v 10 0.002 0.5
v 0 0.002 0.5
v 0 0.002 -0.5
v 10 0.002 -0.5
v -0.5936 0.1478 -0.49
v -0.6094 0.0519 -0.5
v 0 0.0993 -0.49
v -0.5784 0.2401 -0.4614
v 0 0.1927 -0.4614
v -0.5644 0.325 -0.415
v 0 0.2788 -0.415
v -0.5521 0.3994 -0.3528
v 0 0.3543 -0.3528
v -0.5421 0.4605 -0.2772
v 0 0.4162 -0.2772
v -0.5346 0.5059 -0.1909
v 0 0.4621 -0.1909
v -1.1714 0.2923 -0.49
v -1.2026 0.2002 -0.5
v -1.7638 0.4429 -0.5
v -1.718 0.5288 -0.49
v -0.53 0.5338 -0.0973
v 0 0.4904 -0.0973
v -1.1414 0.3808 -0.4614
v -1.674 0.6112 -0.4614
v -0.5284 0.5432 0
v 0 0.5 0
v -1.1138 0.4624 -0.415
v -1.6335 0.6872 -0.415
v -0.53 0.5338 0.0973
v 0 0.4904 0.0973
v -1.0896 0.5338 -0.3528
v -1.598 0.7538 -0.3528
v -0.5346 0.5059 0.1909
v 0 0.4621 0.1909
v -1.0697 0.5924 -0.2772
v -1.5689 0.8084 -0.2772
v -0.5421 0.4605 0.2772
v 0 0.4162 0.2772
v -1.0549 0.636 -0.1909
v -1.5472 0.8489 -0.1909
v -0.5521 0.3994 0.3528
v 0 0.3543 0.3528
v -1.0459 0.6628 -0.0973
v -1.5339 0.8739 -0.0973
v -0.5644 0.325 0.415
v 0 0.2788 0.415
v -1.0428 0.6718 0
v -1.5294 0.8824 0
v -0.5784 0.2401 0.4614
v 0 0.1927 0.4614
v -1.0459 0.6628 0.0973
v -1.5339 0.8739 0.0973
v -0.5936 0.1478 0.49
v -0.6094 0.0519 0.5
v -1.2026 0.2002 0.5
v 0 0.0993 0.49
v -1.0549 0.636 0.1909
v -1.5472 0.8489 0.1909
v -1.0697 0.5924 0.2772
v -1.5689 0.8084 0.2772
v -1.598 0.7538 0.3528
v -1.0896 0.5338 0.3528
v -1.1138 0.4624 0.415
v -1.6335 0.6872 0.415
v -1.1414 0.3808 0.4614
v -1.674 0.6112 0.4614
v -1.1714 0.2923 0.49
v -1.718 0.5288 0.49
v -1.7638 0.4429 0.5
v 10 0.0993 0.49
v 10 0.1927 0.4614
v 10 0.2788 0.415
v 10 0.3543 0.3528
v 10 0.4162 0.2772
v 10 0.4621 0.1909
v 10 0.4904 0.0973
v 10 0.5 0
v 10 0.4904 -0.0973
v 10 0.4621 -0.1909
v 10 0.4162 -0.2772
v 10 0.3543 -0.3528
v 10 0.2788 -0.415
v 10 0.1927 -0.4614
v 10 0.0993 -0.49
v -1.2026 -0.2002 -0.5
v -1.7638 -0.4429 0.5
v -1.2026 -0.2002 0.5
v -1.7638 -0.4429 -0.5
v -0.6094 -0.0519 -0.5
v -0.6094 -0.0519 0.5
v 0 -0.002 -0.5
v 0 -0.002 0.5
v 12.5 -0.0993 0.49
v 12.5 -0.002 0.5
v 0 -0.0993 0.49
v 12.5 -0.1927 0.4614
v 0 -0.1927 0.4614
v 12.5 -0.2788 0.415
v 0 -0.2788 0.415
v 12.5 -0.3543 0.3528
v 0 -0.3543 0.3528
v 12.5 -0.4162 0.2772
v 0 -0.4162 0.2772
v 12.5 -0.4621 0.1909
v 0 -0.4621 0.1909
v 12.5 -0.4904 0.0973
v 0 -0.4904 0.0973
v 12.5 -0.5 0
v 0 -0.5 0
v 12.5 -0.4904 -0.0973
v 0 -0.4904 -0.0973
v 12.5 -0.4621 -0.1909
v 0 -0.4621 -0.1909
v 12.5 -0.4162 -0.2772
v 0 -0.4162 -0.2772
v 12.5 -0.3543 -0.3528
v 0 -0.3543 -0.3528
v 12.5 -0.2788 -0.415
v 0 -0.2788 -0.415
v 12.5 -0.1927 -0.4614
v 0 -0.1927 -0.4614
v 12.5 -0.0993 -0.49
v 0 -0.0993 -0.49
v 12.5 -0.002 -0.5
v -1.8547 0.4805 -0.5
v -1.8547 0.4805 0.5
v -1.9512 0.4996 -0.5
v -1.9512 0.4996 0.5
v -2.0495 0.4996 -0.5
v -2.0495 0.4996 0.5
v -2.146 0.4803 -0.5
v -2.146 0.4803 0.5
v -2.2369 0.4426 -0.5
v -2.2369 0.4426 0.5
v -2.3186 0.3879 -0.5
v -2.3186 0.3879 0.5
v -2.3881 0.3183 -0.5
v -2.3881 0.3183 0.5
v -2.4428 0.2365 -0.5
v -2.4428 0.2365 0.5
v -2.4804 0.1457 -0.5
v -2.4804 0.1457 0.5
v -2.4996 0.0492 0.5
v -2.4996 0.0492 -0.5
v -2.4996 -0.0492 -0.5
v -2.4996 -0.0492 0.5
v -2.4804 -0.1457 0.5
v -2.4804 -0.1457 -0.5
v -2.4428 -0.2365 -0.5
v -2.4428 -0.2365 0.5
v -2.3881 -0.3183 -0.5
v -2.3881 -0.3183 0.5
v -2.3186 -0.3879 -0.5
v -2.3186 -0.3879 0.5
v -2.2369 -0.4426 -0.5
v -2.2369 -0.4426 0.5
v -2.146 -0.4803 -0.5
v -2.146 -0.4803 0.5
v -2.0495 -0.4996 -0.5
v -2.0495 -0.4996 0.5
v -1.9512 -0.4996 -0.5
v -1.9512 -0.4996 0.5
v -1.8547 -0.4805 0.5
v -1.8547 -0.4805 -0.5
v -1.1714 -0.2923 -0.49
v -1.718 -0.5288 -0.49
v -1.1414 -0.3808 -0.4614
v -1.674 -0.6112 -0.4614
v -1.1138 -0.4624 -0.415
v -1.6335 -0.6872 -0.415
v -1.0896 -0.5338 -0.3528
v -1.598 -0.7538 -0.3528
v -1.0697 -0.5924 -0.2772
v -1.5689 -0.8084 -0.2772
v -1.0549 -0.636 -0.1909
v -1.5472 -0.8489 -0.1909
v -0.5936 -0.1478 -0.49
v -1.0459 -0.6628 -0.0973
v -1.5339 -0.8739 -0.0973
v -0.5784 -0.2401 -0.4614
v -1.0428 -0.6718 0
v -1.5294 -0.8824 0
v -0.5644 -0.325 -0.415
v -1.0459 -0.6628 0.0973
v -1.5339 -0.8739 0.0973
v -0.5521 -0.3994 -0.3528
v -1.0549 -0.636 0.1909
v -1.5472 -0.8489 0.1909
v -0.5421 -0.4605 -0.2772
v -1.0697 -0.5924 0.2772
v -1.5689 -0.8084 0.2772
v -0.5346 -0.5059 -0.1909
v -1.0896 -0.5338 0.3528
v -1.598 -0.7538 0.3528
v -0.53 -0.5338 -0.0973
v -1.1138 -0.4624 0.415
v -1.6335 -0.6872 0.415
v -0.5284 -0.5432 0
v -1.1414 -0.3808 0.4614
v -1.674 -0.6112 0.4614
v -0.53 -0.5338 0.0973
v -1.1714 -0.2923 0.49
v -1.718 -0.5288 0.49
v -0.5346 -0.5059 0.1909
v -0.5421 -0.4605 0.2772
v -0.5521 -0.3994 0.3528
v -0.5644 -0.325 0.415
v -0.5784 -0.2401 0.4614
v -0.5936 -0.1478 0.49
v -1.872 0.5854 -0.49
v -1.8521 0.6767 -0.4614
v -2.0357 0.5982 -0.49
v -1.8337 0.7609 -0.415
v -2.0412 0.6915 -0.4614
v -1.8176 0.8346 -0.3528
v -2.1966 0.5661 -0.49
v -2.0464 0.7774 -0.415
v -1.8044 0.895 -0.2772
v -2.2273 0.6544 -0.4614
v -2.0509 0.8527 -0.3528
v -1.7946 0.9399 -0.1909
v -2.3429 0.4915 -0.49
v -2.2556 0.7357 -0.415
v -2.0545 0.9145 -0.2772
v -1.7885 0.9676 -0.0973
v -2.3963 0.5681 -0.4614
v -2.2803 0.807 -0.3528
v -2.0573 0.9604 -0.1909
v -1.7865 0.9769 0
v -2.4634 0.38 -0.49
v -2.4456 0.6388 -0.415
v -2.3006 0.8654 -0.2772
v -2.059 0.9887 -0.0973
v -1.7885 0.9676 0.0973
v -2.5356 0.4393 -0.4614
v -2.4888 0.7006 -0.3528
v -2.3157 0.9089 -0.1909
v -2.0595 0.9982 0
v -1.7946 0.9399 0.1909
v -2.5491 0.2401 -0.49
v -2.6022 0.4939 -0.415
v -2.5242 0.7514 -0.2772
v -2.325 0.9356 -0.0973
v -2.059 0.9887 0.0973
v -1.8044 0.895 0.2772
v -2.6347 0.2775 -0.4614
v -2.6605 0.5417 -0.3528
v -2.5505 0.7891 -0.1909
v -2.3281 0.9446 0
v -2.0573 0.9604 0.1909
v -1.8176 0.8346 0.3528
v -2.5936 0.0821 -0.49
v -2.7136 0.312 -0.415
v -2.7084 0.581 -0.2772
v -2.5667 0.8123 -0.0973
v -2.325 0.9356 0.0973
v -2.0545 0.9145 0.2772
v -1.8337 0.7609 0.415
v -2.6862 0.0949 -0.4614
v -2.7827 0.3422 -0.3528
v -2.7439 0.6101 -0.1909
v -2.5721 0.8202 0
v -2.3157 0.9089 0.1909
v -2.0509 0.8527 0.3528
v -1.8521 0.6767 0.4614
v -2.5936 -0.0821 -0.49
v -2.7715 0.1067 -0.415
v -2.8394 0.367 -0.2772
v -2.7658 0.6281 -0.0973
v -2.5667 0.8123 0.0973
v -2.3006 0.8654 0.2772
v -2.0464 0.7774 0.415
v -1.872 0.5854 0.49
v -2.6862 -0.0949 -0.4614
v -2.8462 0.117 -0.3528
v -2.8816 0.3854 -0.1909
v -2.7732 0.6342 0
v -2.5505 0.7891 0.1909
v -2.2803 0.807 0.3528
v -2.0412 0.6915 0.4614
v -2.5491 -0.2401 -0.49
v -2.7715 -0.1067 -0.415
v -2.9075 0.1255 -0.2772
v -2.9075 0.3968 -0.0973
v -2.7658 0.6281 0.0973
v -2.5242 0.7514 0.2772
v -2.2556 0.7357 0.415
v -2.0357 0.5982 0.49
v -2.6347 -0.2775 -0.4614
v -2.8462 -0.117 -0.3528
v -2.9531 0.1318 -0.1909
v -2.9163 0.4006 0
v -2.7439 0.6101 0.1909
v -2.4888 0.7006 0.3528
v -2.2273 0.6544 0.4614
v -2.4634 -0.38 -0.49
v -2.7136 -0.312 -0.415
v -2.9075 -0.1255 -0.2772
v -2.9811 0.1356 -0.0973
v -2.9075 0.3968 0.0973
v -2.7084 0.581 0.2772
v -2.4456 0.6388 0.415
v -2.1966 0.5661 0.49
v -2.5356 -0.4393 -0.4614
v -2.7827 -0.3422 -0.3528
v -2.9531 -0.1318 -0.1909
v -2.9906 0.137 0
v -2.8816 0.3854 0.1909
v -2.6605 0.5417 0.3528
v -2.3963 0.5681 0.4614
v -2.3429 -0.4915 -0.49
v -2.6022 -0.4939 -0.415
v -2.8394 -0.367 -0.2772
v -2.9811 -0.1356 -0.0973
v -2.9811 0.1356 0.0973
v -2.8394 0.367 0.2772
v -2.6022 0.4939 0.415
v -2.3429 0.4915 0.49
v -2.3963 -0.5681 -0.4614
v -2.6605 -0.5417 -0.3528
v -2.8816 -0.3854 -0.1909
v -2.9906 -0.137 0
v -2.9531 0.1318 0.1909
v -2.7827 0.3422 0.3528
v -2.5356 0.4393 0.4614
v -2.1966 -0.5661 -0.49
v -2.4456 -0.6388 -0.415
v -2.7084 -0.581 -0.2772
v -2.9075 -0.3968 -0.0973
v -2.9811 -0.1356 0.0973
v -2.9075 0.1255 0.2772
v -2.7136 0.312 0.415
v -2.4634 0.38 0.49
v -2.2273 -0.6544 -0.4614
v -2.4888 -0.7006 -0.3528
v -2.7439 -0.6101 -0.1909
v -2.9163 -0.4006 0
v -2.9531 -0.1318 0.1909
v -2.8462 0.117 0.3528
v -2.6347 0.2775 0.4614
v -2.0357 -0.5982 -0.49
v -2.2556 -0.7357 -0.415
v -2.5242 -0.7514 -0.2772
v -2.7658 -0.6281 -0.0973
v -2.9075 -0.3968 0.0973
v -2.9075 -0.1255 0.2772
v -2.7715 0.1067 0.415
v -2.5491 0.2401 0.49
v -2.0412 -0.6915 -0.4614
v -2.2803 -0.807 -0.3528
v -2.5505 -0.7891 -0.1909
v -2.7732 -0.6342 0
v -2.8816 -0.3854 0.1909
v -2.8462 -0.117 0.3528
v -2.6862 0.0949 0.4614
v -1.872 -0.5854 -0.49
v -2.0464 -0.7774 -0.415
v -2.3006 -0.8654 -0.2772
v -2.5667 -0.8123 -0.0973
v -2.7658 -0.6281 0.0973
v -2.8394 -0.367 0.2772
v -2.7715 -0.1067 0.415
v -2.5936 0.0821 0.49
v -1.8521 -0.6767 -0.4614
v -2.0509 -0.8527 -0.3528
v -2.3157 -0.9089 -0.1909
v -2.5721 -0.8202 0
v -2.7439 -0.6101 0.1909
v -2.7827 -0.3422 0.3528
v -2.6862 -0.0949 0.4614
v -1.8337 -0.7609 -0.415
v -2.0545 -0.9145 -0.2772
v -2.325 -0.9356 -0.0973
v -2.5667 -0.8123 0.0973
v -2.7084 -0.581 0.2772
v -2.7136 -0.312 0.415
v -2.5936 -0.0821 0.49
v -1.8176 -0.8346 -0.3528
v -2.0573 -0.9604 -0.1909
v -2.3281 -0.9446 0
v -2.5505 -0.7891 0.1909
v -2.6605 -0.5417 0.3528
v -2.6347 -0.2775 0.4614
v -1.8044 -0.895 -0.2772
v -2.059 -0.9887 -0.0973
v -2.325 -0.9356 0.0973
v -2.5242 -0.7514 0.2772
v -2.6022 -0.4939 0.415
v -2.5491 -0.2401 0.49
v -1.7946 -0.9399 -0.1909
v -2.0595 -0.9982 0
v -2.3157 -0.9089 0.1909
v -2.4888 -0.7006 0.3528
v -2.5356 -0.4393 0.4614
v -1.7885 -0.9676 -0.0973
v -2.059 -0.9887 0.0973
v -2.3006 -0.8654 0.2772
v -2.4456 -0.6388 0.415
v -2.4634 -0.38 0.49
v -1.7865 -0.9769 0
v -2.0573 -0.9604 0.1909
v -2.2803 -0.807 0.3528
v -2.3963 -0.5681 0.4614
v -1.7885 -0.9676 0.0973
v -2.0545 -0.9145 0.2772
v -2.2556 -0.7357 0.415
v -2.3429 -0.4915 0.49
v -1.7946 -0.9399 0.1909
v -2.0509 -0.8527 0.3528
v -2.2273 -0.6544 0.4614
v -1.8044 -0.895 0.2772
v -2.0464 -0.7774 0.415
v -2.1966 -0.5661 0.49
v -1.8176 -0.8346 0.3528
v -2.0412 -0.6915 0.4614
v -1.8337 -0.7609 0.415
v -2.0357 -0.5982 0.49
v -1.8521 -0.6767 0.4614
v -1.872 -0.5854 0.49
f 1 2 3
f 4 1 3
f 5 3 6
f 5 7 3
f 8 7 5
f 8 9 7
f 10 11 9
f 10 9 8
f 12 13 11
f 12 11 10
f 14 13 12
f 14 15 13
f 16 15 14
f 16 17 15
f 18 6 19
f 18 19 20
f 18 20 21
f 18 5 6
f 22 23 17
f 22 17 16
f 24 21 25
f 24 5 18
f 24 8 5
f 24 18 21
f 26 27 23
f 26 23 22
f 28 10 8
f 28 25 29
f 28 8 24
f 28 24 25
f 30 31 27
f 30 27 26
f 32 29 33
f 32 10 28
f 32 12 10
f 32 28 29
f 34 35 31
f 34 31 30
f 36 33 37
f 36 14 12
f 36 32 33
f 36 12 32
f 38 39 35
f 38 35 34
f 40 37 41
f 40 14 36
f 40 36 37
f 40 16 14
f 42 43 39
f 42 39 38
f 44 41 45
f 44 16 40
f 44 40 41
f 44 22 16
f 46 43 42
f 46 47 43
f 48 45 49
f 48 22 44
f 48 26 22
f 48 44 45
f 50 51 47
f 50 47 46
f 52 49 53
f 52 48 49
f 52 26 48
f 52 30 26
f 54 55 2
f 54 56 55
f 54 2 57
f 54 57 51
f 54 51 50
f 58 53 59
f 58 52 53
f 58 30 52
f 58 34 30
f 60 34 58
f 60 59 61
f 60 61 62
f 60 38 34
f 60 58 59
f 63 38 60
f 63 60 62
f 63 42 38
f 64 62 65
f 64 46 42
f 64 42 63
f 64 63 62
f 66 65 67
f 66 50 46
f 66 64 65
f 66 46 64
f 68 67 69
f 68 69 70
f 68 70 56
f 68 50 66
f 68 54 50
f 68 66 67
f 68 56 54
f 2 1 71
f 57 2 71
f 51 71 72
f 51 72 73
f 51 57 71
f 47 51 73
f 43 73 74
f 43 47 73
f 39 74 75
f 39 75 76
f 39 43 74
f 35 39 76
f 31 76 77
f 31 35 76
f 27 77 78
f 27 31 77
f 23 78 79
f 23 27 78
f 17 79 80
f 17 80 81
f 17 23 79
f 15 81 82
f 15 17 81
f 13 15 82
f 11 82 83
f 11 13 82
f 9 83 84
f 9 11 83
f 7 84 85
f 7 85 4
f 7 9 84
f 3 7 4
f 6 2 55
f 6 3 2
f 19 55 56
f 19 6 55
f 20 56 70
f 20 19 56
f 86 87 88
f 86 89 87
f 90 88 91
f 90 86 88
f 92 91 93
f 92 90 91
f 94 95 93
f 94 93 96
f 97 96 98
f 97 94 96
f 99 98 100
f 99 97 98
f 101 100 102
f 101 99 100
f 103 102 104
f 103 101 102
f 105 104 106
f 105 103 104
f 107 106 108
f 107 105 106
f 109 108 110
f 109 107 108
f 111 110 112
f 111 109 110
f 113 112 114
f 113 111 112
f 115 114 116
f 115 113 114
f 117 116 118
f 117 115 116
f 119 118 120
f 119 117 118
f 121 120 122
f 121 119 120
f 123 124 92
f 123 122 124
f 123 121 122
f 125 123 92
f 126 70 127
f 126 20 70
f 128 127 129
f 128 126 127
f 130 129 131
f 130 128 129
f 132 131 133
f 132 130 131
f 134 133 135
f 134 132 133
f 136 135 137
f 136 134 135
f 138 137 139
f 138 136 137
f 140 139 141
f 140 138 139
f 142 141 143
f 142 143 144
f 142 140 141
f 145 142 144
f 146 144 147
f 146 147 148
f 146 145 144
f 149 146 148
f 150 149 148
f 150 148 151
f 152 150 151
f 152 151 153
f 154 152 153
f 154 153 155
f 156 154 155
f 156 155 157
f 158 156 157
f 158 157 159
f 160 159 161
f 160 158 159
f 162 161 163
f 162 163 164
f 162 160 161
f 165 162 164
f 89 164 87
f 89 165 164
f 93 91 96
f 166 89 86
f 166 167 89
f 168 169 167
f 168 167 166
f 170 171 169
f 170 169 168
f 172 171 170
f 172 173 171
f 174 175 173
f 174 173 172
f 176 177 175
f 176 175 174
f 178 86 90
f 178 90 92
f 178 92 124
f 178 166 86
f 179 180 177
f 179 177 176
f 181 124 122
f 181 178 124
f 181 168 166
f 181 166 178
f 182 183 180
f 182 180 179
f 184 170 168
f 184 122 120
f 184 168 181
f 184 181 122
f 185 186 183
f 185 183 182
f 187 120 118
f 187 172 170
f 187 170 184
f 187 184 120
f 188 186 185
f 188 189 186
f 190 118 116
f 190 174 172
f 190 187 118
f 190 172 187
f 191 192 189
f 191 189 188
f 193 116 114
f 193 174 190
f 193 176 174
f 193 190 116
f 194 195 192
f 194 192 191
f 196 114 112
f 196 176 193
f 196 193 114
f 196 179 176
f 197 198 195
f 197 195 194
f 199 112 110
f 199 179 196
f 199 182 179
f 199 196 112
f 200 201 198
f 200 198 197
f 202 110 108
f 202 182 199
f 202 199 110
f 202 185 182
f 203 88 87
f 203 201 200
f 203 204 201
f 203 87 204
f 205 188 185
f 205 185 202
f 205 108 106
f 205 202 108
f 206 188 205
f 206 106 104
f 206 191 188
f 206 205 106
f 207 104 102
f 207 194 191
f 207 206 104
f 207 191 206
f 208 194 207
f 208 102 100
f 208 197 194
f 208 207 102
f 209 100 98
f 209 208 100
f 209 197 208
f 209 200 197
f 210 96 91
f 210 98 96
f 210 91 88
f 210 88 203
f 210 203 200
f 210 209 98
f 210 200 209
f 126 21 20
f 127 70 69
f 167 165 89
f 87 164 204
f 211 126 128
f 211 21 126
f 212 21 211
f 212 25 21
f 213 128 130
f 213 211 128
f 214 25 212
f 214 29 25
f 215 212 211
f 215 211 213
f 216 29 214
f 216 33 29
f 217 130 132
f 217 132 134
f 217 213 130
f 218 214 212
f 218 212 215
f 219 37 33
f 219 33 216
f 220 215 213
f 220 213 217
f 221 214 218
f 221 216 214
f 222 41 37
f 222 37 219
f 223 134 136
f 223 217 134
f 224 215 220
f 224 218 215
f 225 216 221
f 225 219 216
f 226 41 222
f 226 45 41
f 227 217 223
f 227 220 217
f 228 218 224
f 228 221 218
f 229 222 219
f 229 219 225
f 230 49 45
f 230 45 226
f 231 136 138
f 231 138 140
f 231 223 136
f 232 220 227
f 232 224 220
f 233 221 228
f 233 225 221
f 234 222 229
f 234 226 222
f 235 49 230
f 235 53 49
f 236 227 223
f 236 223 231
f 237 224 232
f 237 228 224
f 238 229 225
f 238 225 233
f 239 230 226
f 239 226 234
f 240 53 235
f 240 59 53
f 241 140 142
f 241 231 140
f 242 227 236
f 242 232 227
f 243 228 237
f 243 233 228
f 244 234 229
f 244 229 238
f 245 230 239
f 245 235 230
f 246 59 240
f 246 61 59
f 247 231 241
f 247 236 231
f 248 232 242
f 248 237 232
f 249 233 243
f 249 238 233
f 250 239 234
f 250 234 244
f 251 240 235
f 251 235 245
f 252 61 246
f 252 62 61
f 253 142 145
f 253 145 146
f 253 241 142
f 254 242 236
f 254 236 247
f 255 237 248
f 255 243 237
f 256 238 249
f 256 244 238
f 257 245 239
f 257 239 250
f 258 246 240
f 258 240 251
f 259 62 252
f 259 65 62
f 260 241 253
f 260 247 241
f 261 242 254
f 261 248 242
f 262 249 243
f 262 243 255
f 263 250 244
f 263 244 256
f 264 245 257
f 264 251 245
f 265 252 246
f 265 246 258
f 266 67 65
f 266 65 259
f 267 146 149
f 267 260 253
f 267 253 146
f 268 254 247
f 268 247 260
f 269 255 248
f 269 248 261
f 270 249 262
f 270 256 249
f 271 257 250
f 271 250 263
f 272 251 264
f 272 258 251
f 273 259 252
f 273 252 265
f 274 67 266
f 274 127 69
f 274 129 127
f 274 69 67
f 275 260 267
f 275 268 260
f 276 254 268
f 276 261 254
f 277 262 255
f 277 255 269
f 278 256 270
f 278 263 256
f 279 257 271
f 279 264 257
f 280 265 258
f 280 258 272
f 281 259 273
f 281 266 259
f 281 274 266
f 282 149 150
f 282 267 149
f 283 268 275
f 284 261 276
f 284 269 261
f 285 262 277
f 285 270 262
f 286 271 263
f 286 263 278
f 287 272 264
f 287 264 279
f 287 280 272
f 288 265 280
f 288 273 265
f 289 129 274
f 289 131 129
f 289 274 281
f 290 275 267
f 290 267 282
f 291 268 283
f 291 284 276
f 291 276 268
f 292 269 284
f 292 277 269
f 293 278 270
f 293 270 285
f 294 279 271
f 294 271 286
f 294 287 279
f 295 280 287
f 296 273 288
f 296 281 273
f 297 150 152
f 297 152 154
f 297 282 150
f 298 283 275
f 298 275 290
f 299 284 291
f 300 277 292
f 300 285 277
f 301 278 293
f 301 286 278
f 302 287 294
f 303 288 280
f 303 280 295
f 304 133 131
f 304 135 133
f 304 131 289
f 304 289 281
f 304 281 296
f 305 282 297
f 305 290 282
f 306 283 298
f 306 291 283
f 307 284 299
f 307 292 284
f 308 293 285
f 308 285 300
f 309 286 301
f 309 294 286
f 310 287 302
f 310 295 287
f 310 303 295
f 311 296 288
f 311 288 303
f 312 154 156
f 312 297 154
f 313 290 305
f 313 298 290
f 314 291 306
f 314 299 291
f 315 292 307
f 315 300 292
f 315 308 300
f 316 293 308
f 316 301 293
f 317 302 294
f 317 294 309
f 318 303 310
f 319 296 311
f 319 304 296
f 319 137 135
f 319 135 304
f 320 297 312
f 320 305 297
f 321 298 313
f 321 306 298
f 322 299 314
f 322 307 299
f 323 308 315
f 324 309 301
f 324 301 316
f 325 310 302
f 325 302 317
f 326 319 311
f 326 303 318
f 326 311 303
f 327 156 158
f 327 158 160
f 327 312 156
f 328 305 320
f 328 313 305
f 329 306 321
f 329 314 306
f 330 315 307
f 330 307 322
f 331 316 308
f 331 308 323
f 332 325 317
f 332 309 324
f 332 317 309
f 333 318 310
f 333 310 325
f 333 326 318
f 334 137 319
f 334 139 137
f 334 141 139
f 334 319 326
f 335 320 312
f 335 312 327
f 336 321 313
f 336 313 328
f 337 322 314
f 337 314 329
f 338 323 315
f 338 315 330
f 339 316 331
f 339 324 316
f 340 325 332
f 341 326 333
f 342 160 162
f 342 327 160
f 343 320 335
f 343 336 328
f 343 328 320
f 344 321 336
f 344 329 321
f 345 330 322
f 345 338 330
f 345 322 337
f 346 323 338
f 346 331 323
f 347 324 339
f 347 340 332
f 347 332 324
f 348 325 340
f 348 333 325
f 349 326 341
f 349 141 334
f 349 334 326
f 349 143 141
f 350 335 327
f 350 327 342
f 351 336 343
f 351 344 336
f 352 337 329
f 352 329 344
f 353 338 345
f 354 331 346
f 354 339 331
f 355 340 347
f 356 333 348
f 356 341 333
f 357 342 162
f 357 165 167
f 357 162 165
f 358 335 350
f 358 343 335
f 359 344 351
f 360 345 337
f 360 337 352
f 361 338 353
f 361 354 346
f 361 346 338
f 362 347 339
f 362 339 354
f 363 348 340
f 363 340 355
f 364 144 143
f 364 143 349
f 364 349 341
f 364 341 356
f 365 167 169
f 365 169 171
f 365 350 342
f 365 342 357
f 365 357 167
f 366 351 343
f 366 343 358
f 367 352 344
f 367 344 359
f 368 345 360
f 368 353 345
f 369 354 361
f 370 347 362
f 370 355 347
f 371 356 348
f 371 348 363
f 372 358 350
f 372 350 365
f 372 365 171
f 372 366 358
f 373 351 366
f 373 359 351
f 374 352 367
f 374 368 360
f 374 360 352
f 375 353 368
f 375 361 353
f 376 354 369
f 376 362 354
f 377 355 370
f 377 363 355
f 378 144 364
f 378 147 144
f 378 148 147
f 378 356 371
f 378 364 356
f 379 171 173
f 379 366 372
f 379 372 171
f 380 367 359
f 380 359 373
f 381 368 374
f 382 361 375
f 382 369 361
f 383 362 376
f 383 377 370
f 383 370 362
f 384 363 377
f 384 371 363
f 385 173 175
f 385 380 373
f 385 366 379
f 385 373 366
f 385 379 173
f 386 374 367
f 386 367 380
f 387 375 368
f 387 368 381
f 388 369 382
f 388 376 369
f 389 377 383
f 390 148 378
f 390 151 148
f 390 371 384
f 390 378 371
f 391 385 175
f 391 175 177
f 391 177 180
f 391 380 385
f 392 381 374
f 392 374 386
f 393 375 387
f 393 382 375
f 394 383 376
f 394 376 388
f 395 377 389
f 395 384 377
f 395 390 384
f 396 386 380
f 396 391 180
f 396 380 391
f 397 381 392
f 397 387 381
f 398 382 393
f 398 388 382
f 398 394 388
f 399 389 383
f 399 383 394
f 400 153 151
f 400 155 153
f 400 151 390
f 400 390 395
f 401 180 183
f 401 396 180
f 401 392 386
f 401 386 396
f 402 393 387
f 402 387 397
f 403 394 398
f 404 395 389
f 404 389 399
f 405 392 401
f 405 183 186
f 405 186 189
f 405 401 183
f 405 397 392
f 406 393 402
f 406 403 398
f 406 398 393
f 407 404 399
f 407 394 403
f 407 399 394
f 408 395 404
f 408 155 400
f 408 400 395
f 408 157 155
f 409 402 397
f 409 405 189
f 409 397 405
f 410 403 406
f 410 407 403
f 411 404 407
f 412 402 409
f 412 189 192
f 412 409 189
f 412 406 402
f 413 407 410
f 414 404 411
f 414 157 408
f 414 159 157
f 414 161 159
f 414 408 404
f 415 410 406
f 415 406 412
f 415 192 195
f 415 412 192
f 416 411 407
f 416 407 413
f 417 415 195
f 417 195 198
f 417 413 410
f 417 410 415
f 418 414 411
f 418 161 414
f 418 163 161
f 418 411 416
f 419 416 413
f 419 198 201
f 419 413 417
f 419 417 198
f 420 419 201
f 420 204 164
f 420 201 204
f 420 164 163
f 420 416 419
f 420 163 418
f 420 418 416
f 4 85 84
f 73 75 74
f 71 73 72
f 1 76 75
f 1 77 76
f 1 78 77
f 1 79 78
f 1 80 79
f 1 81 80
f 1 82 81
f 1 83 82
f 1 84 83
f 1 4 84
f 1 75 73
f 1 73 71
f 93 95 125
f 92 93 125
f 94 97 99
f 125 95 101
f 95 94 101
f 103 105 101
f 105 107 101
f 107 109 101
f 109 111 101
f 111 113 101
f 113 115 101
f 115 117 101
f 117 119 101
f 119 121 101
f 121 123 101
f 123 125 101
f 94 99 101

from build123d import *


with BuildPart() as part:
    # Body: sweep along a path in PathSke
    with BuildLine(Plane.XY) as body_path:
        Line((10, 0.5), (0, 0.5))
        ThreePointArc((0, 0.5), (-0.788240781, 0.597036875), (-1.529411765, 0.882352941))
        ThreePointArc((-1.529411765, 0.882352941), (-3, 0), (-1.529411765, -0.882352941))
        ThreePointArc((-1.529411765, -0.882352941), (-0.788240781, -0.597036875), (0, -0.5))
        Line((0, -0.5), (12.5, -0.5))
    # SectionSke → Body (sweep)
    with BuildSketch(Plane(origin=(10, 0, 0), x_dir=(0, 0, -1), z_dir=(1, 0, 0))):
        with BuildLine():
            Line((-0.499996, 0.002), (0.499996, 0.002))
            ThreePointArc((0.499996, 0.002), (0, 0.5), (-0.499996, 0.002))
        make_face()
    sweep(path=body_path.line)


solid = part.part
